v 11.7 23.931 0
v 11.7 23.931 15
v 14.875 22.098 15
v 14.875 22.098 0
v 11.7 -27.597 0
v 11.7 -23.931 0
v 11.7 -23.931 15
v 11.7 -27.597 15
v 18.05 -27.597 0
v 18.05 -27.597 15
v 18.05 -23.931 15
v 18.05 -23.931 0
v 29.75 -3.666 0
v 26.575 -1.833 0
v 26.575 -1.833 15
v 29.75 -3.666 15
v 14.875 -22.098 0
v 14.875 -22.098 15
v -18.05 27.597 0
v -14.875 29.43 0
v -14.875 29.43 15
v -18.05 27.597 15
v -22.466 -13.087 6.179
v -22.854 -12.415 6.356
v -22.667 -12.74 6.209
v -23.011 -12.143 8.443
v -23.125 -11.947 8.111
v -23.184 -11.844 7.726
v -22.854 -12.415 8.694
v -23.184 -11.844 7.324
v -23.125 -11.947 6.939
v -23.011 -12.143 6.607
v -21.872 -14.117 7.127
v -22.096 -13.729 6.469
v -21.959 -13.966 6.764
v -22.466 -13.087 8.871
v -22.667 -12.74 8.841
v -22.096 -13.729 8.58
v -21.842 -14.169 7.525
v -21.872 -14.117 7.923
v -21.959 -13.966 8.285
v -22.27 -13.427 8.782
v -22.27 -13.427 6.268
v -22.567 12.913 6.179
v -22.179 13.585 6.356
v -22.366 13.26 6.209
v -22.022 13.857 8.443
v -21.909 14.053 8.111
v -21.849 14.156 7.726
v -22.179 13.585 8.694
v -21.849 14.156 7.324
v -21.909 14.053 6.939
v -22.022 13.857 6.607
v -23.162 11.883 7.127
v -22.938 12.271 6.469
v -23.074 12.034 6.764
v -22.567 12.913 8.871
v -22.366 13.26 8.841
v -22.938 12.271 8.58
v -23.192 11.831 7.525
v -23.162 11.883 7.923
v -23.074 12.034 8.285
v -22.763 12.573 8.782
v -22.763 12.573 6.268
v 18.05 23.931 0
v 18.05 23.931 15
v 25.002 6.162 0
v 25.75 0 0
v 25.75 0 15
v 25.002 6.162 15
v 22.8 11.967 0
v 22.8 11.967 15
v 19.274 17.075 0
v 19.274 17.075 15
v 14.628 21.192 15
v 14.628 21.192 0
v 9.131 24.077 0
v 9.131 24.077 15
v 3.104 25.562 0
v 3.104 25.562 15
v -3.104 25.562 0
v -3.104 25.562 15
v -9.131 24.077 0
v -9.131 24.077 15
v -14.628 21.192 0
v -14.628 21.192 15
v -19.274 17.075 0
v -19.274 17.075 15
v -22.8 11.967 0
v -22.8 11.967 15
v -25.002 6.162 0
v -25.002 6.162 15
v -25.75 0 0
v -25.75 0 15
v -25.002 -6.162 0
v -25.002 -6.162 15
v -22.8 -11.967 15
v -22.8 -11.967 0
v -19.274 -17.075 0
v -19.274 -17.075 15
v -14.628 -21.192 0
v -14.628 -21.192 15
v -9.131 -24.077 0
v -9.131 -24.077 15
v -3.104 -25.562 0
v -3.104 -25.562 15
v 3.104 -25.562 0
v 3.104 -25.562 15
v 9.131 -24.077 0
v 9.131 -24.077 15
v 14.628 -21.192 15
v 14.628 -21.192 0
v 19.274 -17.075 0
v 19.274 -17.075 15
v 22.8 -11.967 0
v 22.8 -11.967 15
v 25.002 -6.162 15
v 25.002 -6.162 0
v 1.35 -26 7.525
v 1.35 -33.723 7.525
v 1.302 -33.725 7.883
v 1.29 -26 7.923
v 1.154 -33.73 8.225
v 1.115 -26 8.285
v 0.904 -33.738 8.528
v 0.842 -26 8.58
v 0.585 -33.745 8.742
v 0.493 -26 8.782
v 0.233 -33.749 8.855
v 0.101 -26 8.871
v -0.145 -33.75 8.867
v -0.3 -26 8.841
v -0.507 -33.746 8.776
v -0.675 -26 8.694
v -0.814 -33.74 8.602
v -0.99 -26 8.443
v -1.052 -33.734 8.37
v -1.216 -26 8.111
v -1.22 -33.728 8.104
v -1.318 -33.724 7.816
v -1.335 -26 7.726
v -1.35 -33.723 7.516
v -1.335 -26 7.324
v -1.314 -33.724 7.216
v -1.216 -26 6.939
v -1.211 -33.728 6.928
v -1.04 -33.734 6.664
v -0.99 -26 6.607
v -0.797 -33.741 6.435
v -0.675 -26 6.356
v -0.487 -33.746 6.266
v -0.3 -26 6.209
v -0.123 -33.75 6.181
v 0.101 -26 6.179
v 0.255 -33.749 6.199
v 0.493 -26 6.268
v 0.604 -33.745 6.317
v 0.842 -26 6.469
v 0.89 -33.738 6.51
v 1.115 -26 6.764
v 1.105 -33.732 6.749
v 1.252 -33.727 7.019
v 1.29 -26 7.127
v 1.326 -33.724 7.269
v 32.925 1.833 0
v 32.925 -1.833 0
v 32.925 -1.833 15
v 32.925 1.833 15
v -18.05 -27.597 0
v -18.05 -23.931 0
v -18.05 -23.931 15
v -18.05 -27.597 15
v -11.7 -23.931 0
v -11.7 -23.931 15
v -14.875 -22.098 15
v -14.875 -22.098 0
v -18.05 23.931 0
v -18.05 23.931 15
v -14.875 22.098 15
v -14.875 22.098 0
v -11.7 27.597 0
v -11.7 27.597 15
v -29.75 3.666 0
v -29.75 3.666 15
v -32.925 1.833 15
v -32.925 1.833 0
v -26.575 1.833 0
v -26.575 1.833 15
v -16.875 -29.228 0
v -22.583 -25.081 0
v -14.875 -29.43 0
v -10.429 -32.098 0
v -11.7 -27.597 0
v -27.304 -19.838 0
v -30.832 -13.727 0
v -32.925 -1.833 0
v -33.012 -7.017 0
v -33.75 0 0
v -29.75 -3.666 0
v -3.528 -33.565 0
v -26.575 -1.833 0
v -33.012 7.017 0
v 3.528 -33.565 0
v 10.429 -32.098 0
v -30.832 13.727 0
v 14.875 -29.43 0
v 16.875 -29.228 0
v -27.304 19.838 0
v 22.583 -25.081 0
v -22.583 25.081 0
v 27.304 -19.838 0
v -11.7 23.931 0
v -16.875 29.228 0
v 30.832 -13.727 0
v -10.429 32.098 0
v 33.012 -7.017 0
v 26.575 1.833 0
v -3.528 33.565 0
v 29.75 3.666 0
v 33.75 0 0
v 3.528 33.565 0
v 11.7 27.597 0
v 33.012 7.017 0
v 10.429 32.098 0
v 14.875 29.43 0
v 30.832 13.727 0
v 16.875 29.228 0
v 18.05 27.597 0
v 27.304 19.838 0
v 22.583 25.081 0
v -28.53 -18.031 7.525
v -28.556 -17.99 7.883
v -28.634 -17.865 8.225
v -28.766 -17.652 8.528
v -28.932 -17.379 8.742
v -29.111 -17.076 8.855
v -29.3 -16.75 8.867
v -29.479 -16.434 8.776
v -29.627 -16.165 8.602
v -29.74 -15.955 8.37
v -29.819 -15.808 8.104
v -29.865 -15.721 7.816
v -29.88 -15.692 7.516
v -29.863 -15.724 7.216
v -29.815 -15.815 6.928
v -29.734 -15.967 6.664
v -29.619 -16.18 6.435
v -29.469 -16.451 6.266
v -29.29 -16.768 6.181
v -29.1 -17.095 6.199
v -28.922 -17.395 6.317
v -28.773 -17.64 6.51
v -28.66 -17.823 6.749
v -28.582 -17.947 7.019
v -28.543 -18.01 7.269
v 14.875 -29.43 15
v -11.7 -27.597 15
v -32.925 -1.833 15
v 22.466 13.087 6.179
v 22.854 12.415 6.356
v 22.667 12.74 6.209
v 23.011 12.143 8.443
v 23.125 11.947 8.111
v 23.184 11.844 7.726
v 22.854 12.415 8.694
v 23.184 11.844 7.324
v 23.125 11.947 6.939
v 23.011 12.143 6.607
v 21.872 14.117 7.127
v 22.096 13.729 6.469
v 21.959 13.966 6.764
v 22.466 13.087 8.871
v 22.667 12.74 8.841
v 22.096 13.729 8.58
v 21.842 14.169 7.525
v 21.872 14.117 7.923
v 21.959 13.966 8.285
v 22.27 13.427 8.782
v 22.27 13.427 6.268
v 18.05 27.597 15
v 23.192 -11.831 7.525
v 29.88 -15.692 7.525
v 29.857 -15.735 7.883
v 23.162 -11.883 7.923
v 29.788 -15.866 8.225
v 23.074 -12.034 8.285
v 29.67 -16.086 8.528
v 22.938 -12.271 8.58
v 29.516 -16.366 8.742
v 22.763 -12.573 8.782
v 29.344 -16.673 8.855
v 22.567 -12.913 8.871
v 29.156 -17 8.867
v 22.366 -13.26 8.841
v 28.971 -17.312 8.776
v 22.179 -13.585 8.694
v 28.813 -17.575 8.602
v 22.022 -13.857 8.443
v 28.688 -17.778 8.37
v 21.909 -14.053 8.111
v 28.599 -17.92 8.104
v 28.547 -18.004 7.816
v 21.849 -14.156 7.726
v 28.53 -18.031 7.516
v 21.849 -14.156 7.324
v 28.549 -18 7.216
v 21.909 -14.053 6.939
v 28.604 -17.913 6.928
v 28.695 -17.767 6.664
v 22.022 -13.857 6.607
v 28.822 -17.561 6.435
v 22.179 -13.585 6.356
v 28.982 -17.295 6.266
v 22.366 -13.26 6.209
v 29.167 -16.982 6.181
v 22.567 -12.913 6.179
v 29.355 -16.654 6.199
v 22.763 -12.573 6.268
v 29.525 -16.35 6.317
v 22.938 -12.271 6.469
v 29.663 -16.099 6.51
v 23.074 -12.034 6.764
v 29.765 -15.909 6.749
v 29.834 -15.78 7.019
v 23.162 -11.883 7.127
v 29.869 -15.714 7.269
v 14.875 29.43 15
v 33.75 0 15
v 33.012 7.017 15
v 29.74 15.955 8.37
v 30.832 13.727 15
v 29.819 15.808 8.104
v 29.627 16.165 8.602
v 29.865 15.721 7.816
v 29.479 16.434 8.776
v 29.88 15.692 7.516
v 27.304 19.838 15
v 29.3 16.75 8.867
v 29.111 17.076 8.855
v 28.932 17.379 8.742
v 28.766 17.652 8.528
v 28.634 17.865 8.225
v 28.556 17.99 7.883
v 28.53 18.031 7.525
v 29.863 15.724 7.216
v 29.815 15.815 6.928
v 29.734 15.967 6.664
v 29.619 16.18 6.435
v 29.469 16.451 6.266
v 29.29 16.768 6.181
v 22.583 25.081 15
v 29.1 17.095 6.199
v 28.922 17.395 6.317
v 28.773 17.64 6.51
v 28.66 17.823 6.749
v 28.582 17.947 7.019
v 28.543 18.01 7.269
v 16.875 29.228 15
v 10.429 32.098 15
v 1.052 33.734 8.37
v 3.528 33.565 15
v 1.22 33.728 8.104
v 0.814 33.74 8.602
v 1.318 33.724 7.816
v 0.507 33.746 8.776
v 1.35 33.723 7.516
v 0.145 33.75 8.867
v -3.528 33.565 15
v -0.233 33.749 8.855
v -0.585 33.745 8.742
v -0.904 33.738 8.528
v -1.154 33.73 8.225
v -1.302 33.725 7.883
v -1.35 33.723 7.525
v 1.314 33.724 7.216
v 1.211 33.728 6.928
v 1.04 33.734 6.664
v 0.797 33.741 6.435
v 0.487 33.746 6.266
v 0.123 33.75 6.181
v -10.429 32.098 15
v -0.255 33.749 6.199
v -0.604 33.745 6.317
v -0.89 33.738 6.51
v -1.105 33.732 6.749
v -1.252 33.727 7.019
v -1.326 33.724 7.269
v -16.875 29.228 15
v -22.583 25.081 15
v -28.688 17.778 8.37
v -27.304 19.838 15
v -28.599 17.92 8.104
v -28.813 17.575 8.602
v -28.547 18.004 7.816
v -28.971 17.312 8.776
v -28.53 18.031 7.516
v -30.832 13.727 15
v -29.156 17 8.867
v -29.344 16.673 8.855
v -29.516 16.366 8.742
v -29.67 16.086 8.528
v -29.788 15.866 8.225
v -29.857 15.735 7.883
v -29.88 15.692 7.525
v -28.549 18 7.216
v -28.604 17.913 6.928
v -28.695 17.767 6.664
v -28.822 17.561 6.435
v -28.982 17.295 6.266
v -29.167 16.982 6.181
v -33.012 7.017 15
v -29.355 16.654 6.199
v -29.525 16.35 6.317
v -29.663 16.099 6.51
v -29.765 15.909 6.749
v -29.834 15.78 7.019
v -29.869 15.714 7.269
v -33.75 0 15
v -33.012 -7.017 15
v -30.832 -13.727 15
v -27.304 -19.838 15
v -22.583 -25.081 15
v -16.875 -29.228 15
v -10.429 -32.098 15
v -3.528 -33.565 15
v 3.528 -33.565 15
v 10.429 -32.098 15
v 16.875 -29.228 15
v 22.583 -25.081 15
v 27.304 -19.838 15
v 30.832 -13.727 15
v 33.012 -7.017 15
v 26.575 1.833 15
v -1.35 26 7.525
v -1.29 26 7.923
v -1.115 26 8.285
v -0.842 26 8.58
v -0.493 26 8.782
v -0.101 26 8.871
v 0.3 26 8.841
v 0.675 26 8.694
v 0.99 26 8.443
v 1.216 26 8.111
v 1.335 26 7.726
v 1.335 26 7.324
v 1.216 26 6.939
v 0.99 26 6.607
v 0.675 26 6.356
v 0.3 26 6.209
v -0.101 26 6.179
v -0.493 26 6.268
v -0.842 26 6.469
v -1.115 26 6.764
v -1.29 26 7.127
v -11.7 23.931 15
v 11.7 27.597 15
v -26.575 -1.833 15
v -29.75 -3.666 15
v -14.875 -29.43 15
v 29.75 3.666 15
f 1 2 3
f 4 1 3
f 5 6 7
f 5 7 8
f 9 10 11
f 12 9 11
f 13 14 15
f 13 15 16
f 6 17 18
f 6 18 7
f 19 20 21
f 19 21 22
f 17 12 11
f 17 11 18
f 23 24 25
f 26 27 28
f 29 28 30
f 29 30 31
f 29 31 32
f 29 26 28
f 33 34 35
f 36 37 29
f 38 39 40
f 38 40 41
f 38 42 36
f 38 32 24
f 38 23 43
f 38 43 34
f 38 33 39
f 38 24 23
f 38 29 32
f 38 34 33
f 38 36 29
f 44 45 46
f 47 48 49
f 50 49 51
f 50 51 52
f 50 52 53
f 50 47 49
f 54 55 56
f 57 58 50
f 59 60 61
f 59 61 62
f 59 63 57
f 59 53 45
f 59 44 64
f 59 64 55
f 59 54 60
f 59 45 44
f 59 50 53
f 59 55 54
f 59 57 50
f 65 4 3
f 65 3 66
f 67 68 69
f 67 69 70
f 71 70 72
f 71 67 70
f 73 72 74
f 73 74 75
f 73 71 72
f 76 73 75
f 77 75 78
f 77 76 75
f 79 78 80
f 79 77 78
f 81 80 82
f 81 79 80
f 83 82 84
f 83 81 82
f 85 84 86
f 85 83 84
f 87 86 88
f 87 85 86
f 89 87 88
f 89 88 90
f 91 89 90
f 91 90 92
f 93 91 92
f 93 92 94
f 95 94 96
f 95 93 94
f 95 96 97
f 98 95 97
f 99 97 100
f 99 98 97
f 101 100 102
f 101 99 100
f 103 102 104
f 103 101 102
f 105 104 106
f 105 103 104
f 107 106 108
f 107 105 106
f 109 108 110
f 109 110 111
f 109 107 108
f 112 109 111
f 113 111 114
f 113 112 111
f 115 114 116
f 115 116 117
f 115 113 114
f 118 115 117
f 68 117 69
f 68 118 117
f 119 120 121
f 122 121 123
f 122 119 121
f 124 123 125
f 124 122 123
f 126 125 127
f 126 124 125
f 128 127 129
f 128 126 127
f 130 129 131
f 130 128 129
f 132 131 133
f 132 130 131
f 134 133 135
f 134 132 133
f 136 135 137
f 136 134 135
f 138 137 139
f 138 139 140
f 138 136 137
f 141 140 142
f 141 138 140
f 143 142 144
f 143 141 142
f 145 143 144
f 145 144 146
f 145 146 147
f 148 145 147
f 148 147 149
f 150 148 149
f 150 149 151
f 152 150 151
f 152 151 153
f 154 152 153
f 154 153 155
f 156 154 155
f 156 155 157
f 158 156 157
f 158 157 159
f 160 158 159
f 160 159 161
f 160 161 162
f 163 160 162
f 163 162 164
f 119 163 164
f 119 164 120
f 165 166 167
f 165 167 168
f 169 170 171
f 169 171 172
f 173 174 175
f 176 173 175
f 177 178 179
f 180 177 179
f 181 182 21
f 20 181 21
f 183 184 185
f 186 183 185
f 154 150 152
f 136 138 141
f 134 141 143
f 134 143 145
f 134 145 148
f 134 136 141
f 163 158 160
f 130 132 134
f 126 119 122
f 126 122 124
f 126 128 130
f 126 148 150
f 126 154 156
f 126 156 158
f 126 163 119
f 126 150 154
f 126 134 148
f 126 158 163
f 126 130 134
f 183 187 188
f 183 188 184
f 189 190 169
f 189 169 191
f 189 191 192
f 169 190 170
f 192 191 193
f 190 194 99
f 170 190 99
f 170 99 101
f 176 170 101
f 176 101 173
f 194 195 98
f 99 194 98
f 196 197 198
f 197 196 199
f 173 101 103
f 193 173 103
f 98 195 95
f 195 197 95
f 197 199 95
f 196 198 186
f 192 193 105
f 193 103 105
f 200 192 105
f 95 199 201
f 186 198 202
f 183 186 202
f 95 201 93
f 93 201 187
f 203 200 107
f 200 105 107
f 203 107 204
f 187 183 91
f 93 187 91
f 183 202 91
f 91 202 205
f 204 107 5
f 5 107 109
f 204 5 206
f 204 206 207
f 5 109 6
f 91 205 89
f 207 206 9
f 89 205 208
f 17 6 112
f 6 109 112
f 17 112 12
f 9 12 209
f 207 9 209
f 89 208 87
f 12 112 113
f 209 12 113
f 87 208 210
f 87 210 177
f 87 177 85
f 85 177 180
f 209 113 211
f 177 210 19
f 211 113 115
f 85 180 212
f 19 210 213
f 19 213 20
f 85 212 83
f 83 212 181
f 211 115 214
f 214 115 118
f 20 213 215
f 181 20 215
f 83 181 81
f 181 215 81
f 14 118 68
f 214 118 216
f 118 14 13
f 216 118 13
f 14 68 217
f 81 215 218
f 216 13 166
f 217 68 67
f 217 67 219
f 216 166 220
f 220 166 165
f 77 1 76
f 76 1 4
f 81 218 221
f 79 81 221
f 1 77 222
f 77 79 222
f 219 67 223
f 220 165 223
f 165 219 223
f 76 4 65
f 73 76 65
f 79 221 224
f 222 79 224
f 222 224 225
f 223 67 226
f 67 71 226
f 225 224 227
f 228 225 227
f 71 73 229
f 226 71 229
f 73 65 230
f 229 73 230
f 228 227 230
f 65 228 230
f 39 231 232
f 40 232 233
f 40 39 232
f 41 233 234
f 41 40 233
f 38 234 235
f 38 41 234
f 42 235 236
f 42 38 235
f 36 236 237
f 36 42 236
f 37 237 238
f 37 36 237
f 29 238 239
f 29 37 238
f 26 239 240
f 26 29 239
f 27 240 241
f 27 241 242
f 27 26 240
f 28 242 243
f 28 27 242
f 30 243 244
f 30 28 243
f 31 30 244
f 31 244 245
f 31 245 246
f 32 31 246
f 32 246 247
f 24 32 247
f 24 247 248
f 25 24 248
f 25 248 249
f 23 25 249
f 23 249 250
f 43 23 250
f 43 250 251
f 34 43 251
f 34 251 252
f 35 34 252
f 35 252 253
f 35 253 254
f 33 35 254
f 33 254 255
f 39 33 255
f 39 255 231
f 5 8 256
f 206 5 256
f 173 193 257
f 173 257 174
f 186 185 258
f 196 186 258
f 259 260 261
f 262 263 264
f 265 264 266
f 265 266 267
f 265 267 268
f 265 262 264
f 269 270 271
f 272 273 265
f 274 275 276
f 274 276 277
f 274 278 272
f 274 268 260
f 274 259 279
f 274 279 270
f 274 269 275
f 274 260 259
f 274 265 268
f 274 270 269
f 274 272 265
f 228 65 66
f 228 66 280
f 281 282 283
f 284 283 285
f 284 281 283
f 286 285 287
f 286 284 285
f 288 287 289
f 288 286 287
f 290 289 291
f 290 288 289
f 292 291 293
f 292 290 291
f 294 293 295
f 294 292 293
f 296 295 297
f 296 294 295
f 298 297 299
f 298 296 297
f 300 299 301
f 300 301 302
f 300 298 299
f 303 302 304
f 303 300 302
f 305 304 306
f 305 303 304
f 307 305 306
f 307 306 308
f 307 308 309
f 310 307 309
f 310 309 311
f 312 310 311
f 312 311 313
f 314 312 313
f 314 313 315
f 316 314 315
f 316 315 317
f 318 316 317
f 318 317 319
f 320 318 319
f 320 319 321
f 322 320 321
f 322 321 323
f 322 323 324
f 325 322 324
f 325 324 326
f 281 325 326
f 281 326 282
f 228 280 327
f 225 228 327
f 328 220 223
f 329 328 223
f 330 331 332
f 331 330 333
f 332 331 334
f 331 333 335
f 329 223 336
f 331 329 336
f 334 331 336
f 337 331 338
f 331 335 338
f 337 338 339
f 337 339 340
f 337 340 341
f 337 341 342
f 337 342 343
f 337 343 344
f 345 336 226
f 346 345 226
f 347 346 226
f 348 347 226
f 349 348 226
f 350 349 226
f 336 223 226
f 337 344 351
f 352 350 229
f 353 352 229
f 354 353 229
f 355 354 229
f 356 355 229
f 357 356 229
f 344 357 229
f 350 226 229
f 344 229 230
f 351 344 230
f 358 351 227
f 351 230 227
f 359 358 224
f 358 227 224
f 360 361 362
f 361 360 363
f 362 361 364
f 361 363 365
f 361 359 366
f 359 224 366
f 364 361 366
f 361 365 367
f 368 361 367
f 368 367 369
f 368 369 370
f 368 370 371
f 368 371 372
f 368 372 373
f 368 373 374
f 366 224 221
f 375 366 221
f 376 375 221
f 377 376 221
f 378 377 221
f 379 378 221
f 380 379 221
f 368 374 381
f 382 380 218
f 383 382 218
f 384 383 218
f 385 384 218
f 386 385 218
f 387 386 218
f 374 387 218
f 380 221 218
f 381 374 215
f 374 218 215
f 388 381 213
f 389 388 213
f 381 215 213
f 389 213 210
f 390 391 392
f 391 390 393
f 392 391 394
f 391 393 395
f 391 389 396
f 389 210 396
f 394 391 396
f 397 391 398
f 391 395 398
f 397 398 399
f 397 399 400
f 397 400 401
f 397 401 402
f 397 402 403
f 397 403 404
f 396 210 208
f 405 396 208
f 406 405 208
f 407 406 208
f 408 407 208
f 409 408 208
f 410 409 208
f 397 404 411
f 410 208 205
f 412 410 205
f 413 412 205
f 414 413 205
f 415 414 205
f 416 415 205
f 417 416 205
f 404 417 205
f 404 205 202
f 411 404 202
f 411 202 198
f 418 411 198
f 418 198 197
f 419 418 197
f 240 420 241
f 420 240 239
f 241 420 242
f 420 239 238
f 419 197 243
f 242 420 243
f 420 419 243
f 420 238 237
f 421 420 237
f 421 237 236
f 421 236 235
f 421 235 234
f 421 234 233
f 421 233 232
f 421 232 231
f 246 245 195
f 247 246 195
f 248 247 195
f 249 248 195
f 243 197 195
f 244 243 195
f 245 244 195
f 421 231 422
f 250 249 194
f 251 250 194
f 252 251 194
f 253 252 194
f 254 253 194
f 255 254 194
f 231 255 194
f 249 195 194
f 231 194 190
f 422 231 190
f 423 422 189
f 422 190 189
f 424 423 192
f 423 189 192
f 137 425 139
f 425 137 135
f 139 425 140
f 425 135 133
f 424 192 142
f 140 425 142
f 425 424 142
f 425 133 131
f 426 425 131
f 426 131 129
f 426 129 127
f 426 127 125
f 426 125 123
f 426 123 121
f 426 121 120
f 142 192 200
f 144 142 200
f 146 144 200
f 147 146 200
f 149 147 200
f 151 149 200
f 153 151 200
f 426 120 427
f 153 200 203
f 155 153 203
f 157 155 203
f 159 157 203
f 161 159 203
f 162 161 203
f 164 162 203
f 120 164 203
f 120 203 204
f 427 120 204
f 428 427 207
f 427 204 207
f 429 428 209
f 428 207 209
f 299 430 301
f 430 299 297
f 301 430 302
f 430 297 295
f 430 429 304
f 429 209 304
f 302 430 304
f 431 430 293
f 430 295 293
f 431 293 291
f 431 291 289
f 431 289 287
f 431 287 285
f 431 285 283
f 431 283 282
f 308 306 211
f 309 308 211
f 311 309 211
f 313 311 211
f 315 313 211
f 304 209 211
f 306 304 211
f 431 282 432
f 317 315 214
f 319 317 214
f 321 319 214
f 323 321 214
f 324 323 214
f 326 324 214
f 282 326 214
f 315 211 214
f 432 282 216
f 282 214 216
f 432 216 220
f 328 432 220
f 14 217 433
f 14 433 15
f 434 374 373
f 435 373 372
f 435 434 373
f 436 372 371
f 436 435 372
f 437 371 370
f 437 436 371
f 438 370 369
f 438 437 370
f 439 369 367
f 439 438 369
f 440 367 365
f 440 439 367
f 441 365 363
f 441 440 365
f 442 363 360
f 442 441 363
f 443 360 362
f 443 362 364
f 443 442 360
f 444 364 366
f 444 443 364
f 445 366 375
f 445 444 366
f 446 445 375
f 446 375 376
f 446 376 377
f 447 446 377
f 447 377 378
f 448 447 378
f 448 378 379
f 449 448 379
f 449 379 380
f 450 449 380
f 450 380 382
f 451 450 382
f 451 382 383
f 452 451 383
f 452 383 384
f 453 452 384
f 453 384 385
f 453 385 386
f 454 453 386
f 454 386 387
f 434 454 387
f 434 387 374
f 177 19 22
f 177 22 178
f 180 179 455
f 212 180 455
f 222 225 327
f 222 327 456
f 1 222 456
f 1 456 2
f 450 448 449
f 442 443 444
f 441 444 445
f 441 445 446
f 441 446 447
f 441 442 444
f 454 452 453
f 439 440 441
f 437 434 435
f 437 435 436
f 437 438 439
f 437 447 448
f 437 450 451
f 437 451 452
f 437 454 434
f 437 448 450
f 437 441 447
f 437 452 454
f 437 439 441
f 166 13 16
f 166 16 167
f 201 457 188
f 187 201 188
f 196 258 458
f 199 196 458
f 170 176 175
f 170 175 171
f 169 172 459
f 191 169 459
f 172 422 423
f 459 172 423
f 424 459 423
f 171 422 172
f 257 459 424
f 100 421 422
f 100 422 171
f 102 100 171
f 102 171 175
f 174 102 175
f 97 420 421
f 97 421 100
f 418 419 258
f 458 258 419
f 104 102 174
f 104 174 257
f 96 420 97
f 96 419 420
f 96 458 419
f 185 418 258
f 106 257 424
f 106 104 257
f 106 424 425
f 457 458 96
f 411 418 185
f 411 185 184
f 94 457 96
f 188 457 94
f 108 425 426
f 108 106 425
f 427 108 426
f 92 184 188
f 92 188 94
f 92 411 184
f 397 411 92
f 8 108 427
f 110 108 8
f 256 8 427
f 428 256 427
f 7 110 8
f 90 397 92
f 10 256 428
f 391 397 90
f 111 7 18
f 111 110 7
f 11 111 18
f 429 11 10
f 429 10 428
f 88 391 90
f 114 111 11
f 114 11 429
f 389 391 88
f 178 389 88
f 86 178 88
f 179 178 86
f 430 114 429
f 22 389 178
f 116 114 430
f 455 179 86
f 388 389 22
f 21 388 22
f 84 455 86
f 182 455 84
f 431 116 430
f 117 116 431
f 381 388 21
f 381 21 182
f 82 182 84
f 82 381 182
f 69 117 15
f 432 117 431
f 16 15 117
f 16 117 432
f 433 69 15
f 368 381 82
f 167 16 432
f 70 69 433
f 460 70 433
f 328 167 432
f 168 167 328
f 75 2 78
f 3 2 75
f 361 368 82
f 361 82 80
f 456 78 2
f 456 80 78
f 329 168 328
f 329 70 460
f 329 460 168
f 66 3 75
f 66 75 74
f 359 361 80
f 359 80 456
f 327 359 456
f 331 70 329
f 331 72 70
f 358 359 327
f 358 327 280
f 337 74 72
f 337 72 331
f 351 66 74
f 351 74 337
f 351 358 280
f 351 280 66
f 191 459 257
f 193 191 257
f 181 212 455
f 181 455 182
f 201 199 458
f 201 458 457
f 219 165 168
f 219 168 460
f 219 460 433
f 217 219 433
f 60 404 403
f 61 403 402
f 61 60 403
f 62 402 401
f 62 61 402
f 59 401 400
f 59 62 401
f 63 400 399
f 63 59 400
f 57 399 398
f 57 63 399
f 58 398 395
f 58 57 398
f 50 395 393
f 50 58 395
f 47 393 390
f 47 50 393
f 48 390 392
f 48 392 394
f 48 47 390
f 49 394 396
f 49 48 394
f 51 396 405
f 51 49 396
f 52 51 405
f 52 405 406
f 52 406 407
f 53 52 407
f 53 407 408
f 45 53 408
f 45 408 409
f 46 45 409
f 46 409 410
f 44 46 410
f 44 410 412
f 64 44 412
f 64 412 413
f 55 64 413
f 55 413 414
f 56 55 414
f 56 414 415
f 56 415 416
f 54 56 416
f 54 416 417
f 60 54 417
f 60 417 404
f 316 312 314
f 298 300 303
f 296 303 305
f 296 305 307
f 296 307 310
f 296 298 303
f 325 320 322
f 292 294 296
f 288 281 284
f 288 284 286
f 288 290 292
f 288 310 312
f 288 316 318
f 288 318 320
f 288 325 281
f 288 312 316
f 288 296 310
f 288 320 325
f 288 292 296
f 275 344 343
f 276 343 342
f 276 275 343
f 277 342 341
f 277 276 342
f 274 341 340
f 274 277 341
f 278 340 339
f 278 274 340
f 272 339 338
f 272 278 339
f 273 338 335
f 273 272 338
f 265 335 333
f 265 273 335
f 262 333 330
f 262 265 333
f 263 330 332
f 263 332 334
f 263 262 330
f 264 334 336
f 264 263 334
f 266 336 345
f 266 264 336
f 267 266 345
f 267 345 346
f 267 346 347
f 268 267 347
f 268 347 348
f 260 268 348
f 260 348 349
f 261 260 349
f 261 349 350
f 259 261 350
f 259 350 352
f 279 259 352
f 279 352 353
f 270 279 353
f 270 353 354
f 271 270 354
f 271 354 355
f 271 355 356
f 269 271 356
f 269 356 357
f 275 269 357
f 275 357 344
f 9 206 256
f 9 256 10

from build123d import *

# Parameters (mm, degrees)
F0_R     = 33.75
F0_R_2   = 25.75
F1_DEPTH = 15
F3_DEPTH = 20
F4_COUNT = 6
F6_R     = 1.35
F7_DEPTH = 40
F9_COUNT = 6


with BuildPart() as f1:
    # F0 (on Top) → F1 (new body)
    with BuildSketch(Plane.XY):
        Circle(F0_R)
        Circle(F0_R_2, mode=Mode.SUBTRACT)
    extrude(amount=F1_DEPTH)


with BuildPart() as f3:
    # F2 (on face) → F3 (new body)
    with BuildSketch(Plane.XY.offset(15)):
        Polygon((-26.575, -1.833087), (-26.575, 1.833087), (-29.75, 3.666174), (-32.925, 1.833087), (-32.925, -1.833087), (-29.75, -3.666174), align=None)
    extrude(amount=-F3_DEPTH)


with BuildPart() as f4_1:
    # F4: instance of F3
    add(f3.part.rotate(Axis((0, 0, 15), (0, 0, 1)), 1 * 360 / F4_COUNT))


with BuildPart() as f4_2:
    # F4: instance of F3
    add(f3.part.rotate(Axis((0, 0, 15), (0, 0, 1)), 2 * 360 / F4_COUNT))


with BuildPart() as f4_3:
    # F4: instance of F3
    add(f3.part.rotate(Axis((0, 0, 15), (0, 0, 1)), 3 * 360 / F4_COUNT))


with BuildPart() as f4_4:
    # F4: instance of F3
    add(f3.part.rotate(Axis((0, 0, 15), (0, 0, 1)), 4 * 360 / F4_COUNT))


with BuildPart() as f4_5:
    # F4: instance of F3
    add(f3.part.rotate(Axis((0, 0, 15), (0, 0, 1)), 5 * 360 / F4_COUNT))


with BuildPart() as f1_1:
    add(f1.part)

    # F5: cut F4_1, F3, F4_2, F4_3, F4_4, F4_5
    add(f4_1.part, mode=Mode.SUBTRACT)
    add(f3.part, mode=Mode.SUBTRACT)
    add(f4_2.part, mode=Mode.SUBTRACT)
    add(f4_3.part, mode=Mode.SUBTRACT)
    add(f4_4.part, mode=Mode.SUBTRACT)
    add(f4_5.part, mode=Mode.SUBTRACT)


with BuildPart() as f7:
    # F6 (on Front) → F7 (new body)
    with BuildSketch(Plane.XZ):
        with Locations((0, 7.524926)):
            Circle(F6_R)
    extrude(amount=F7_DEPTH)


with BuildPart() as f7_1:
    # F8: moved
    add(f7.part.moved(Location((0, -26, 0))))


with BuildPart() as f9_1:
    # F9: instance of F7
    add(f7_1.part.rotate(Axis((0, 0, 15), (0, 0, 1)), 1 * 360 / F9_COUNT))


with BuildPart() as f9_2:
    # F9: instance of F7
    add(f7_1.part.rotate(Axis((0, 0, 15), (0, 0, 1)), 2 * 360 / F9_COUNT))


with BuildPart() as f9_3:
    # F9: instance of F7
    add(f7_1.part.rotate(Axis((0, 0, 15), (0, 0, 1)), 3 * 360 / F9_COUNT))


with BuildPart() as f9_4:
    # F9: instance of F7
    add(f7_1.part.rotate(Axis((0, 0, 15), (0, 0, 1)), 4 * 360 / F9_COUNT))


with BuildPart() as f9_5:
    # F9: instance of F7
    add(f7_1.part.rotate(Axis((0, 0, 15), (0, 0, 1)), 5 * 360 / F9_COUNT))


with BuildPart() as f1_2:
    add(f1_1.part)

    # F10: cut F7, F9_1, F9_2, F9_3, F9_4, F9_5
    add(f7_1.part, mode=Mode.SUBTRACT)
    add(f9_1.part, mode=Mode.SUBTRACT)
    add(f9_2.part, mode=Mode.SUBTRACT)
    add(f9_3.part, mode=Mode.SUBTRACT)
    add(f9_4.part, mode=Mode.SUBTRACT)
    add(f9_5.part, mode=Mode.SUBTRACT)


solid = f1_2.part
